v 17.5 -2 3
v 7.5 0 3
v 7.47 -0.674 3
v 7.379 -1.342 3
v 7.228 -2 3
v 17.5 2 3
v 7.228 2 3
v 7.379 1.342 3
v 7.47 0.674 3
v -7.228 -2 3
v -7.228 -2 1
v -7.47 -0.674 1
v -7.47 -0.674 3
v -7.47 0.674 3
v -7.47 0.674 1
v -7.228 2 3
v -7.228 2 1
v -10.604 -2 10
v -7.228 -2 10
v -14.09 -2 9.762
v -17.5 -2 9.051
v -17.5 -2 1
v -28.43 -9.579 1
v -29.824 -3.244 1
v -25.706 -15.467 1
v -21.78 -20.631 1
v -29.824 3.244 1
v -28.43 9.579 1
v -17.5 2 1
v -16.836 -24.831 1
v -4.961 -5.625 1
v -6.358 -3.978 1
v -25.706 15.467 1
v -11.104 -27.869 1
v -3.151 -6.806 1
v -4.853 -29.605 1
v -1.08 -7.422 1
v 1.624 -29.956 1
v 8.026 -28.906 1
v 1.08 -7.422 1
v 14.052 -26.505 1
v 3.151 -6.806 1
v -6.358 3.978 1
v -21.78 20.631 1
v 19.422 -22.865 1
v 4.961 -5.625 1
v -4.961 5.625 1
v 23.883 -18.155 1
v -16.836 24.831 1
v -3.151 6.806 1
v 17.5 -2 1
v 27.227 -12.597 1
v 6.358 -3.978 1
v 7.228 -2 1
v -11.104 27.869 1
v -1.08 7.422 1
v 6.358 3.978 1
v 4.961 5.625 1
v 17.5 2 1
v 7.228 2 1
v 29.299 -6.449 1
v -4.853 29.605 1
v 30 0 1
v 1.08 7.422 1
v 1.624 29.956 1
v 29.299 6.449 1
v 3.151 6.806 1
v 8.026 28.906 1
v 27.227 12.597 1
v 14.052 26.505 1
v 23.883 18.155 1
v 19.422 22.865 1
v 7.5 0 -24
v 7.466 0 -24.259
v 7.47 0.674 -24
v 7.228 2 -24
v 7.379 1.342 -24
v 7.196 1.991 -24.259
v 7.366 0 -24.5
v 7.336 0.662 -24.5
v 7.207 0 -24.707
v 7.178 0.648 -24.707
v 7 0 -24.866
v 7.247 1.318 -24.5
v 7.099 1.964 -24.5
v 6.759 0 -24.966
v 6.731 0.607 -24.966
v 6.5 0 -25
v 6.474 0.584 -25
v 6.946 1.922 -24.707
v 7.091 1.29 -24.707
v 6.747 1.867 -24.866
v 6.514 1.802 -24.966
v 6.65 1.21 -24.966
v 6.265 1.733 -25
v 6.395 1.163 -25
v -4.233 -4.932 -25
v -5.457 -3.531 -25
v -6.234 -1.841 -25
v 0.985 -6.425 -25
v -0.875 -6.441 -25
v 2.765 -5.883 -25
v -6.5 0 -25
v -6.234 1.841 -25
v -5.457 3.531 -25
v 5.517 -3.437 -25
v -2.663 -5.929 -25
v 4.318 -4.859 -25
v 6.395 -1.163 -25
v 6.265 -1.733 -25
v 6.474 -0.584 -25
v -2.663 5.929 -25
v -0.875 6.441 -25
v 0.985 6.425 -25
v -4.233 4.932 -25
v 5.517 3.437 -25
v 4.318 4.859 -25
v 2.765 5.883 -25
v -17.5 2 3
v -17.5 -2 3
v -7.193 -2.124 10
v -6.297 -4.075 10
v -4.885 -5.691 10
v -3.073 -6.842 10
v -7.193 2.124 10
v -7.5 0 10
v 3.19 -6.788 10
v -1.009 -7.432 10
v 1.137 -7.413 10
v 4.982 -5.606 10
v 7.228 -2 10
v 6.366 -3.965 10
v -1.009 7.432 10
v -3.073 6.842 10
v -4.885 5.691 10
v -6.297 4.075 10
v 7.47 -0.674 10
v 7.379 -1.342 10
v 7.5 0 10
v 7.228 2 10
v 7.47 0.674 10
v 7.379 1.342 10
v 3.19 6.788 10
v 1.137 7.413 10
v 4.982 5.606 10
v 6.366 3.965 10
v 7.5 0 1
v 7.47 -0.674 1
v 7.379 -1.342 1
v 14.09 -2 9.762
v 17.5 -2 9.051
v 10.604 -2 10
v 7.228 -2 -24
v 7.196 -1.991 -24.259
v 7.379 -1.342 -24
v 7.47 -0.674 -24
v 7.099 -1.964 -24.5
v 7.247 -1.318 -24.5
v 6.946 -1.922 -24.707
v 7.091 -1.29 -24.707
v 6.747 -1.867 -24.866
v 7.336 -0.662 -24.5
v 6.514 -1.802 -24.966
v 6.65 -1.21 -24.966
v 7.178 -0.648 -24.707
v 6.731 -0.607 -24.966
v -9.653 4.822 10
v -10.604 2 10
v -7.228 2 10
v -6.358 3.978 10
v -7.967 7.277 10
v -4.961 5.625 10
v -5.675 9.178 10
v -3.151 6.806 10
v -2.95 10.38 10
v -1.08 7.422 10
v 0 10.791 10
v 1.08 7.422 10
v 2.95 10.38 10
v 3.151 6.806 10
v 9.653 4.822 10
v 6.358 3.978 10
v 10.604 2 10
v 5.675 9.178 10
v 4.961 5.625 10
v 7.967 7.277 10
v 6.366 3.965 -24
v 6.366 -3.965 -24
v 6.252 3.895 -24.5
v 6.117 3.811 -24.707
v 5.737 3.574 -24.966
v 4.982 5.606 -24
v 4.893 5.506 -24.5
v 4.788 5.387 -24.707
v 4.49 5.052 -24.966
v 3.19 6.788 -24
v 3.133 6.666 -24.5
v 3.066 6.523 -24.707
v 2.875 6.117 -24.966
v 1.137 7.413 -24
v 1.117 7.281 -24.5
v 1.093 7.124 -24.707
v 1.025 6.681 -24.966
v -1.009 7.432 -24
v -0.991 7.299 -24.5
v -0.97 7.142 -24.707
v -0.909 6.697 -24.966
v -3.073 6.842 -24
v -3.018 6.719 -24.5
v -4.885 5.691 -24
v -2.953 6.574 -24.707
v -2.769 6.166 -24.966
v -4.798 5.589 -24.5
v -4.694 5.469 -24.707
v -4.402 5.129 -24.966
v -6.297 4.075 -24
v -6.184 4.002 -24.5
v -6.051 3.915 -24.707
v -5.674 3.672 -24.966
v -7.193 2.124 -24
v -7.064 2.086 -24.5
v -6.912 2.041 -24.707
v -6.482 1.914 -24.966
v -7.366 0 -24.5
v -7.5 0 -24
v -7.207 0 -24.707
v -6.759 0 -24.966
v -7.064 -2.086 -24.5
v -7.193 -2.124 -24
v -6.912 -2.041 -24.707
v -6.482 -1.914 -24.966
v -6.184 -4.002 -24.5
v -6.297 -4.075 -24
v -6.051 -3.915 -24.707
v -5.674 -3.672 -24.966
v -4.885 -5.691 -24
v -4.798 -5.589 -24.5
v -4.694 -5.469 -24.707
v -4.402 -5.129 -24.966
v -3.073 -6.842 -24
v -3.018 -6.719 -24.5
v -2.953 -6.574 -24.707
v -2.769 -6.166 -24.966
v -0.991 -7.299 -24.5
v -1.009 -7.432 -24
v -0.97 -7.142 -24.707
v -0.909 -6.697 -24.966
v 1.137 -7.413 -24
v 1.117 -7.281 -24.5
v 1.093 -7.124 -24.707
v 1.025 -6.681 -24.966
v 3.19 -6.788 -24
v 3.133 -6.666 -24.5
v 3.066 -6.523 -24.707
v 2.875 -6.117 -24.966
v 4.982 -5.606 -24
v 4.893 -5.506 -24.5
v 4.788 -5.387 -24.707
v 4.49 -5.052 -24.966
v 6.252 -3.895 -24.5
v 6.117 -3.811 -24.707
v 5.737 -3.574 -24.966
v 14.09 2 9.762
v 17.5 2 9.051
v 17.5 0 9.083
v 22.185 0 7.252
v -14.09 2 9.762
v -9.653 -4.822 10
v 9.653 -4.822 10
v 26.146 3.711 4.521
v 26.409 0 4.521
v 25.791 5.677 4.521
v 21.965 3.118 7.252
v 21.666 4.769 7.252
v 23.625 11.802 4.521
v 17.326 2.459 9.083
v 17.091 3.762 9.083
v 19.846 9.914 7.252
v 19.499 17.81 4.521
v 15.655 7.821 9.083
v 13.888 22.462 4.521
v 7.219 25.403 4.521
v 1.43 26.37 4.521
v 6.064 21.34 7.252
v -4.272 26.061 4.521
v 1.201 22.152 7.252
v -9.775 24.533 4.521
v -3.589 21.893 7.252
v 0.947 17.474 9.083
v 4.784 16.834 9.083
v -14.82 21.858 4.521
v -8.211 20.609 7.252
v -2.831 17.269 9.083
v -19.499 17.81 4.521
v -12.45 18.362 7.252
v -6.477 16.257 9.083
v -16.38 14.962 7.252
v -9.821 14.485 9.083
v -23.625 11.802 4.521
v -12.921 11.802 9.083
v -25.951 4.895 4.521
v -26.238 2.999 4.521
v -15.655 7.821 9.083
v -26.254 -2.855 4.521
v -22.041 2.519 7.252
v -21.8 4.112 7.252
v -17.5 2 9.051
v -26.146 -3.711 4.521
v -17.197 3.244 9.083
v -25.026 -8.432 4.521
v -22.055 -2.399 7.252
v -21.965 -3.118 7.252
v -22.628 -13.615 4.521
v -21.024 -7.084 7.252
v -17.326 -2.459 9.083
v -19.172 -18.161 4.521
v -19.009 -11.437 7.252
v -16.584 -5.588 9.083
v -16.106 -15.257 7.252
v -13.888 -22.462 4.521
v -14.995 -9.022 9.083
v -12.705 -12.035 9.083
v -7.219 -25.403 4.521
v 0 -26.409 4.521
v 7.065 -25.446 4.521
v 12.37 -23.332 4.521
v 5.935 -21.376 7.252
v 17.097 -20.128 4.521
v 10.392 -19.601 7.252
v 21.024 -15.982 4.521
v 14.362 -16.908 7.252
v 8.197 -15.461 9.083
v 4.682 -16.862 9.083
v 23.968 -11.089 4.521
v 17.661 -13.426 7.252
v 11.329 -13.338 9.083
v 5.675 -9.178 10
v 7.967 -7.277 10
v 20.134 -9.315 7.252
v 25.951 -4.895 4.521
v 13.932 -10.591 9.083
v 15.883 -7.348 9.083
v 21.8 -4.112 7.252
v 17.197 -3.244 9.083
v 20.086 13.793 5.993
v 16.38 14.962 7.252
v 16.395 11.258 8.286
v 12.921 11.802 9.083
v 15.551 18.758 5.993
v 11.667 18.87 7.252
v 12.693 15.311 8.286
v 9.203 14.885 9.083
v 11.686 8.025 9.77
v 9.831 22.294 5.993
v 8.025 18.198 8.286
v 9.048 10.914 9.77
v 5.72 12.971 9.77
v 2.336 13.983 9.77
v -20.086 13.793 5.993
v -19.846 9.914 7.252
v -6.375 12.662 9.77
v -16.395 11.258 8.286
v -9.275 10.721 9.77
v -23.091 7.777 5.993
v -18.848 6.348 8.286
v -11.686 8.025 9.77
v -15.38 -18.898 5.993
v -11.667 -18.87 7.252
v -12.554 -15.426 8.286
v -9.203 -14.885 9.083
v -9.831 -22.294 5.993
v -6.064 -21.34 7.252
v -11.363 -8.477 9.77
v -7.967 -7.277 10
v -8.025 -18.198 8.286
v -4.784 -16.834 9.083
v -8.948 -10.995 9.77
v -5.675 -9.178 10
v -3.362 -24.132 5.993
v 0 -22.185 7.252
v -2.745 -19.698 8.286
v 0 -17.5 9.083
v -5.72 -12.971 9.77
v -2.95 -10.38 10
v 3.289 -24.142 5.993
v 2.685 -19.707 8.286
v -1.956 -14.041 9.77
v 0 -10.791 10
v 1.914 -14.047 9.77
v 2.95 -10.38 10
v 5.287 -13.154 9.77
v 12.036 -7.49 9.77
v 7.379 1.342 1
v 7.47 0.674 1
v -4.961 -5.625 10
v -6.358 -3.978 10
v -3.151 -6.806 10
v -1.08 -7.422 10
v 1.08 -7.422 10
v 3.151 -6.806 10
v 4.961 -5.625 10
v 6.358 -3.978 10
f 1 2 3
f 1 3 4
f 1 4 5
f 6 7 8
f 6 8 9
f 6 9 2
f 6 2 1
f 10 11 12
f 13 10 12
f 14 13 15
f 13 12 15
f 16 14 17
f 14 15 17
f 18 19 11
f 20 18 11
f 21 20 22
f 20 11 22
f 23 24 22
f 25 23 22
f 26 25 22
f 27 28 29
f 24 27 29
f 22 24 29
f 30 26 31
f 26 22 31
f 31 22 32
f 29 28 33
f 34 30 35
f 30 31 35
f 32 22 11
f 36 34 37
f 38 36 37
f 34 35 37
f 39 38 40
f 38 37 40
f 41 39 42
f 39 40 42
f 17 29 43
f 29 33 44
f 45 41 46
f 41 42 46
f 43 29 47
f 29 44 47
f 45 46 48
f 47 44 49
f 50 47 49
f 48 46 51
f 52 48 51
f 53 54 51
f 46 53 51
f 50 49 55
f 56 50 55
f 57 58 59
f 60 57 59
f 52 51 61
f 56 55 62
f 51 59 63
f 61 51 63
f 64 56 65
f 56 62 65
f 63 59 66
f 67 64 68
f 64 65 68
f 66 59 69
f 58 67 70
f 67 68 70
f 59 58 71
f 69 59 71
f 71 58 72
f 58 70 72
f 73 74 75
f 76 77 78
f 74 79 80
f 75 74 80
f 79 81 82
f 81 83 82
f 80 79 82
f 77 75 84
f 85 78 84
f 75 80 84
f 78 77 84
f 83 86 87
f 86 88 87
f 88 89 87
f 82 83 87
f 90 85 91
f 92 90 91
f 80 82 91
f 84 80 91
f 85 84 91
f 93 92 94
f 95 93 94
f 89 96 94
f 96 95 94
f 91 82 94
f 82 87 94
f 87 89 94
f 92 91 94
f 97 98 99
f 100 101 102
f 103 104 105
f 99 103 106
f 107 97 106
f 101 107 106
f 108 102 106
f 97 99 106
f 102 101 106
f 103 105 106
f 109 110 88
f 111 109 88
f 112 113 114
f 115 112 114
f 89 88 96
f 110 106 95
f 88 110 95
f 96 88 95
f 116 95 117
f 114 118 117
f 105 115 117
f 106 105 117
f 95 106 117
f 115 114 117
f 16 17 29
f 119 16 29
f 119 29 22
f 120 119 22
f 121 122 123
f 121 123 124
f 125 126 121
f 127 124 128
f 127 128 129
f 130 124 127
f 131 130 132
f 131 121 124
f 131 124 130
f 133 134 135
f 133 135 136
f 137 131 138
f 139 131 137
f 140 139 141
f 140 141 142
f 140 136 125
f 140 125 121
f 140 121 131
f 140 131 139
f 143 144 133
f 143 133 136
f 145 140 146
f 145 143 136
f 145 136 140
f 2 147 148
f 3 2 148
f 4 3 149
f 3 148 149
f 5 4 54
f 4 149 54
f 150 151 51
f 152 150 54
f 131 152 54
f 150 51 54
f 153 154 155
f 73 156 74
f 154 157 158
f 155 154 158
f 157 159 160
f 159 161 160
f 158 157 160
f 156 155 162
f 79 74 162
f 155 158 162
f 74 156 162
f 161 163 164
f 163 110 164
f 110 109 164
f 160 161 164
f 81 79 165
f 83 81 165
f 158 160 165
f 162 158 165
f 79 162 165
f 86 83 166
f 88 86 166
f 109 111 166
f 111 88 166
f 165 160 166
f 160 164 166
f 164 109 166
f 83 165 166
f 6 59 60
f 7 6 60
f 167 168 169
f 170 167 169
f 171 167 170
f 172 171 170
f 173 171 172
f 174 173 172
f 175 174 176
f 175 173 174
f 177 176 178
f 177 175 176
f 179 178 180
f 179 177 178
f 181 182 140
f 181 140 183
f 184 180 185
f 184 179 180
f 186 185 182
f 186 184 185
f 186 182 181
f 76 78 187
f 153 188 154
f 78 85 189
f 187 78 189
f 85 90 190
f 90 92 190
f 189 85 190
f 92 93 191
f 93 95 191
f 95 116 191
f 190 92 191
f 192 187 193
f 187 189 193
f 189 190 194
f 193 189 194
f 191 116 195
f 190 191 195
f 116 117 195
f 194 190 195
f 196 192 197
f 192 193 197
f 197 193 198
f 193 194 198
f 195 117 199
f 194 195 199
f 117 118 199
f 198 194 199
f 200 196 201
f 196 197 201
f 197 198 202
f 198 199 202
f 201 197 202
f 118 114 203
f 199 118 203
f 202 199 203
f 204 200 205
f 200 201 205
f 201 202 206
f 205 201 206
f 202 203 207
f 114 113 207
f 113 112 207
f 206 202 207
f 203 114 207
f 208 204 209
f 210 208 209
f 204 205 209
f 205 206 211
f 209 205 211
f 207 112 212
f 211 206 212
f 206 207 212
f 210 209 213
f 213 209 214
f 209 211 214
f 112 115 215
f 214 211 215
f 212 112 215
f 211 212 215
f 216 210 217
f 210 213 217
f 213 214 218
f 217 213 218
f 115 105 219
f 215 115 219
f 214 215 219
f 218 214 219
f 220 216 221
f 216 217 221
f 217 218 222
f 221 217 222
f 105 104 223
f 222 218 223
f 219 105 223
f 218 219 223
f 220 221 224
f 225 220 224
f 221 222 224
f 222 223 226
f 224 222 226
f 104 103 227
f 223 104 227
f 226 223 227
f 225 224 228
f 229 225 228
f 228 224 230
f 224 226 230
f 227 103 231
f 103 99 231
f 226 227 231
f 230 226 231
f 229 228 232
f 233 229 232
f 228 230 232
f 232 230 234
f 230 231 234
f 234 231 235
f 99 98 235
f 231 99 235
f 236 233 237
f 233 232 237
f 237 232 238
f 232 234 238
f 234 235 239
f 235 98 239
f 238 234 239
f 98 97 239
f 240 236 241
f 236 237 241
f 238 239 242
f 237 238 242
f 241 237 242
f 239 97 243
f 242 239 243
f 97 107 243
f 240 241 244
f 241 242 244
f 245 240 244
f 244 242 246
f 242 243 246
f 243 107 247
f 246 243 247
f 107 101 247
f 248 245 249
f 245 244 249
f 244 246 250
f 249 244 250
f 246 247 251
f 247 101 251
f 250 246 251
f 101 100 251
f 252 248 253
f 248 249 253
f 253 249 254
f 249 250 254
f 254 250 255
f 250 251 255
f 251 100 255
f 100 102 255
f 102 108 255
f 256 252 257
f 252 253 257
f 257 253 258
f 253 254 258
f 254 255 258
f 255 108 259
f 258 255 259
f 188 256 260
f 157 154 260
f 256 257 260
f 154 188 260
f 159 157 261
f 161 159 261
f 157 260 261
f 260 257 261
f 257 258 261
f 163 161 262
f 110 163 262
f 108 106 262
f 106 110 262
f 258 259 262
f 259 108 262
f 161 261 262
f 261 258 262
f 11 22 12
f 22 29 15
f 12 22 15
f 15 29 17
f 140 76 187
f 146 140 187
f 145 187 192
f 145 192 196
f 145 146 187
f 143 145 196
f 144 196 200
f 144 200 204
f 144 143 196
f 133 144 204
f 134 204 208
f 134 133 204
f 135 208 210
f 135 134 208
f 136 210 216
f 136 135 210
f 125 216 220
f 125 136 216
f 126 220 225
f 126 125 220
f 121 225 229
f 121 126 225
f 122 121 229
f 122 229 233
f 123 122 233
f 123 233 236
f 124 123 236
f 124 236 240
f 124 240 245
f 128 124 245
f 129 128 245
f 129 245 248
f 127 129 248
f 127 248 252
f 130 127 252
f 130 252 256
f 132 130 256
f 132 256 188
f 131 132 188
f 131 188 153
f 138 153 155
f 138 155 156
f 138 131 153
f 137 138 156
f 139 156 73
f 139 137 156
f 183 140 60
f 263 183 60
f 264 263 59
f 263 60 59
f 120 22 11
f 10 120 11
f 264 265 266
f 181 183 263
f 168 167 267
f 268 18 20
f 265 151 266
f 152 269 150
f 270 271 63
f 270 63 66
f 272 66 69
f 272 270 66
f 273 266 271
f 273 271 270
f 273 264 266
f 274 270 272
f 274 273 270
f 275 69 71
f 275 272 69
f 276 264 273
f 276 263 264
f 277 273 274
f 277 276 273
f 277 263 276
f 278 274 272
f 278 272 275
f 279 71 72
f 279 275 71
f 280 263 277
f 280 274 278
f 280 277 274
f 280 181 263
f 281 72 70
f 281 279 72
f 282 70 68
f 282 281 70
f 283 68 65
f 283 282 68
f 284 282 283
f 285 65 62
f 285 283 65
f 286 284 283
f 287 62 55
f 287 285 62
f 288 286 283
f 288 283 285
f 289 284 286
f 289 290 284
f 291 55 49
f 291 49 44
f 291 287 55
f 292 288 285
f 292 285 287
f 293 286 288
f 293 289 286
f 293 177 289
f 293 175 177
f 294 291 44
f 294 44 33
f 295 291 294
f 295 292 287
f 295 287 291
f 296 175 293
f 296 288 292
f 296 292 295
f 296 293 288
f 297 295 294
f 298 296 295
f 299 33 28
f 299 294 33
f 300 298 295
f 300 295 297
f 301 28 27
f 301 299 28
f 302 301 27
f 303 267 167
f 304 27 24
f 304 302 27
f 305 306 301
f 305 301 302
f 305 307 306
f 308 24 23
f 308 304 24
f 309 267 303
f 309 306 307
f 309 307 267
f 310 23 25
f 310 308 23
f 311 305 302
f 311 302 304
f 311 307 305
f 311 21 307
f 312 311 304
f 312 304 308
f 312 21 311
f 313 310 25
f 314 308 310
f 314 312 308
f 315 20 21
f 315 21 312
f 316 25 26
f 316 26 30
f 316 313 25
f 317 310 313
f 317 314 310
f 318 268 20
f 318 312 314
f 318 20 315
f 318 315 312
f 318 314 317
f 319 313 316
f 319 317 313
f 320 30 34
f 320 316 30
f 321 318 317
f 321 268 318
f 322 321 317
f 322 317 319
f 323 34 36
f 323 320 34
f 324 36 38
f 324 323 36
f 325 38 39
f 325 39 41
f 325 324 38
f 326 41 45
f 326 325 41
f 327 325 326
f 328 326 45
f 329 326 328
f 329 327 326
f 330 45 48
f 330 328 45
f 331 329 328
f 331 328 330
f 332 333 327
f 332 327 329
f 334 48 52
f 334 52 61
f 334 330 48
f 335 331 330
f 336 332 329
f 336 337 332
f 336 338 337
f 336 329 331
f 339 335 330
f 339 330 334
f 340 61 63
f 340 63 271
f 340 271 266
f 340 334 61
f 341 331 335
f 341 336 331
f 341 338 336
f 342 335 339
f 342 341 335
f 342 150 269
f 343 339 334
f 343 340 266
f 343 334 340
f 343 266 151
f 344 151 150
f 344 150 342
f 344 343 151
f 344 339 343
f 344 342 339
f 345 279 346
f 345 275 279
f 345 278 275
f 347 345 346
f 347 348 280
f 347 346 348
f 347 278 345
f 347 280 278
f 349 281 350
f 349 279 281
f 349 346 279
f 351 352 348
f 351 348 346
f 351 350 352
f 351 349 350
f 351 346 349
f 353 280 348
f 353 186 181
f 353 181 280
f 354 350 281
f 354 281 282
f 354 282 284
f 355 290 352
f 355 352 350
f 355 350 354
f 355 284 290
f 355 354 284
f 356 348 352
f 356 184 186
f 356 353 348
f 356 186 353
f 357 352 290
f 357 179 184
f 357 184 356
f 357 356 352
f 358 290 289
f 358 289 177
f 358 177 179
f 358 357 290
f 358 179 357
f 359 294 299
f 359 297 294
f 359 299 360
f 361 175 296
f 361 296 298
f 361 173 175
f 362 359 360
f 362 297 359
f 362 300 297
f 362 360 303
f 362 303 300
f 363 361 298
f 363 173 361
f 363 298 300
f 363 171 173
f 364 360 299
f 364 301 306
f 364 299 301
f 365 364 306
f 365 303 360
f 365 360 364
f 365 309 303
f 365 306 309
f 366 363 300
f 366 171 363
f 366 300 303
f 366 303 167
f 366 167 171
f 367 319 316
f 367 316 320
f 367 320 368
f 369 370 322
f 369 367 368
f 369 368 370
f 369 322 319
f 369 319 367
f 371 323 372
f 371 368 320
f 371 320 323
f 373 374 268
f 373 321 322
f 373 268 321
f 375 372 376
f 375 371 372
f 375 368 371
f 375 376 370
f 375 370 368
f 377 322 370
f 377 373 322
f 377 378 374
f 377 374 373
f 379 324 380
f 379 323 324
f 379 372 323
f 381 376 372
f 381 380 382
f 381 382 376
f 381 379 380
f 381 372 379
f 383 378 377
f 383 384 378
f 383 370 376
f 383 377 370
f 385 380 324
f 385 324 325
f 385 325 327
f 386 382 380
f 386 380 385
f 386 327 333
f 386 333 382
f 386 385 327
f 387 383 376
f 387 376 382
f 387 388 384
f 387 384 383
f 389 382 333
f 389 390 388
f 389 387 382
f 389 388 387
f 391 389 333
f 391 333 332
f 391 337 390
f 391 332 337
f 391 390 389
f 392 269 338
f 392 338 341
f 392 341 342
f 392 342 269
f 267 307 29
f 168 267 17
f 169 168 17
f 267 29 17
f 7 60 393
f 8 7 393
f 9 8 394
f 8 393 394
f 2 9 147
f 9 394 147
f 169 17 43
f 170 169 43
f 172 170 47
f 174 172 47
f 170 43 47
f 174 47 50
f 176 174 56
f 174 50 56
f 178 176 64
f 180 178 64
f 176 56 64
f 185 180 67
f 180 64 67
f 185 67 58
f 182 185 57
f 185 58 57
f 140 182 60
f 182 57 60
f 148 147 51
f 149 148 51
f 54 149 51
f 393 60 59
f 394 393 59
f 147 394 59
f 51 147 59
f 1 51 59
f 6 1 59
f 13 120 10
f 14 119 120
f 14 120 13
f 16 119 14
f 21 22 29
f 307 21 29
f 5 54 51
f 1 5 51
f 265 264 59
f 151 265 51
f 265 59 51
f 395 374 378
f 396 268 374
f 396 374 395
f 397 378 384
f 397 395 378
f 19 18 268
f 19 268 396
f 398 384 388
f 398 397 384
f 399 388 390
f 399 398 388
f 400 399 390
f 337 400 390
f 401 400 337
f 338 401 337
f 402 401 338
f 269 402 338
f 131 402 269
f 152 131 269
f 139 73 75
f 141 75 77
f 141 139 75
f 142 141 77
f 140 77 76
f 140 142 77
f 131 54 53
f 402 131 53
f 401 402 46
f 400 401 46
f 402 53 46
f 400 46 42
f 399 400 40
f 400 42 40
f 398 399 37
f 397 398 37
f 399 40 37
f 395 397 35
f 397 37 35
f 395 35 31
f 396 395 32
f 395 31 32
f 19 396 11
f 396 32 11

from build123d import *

# Parameters (mm, degrees)
F1_DEPTH      = 10
F1_DEPTH_BACK = 25
F2_START      = 1
F0_R          = 30
F2_DEPTH      = 9
F4_R          = 1
F5_START      = 1
F5_DEPTH      = 2


# Not quite as in the source:
# - a fillet or chamfer that OpenCascade refuses, or shapes differently, is made with other operations: its cross-section is extruded or revolved along the edge and cut away or added


with BuildPart() as f1:
    # F0 (on Top) → F1 (new body, two sides)
    with BuildSketch(Plane.XY) as f1_sk:
        with BuildLine():
            ThreePointArc((7.2284161474, -2), (7.4317938987, -1.0091776094), (7.5, 0))
            ThreePointArc((7.5, 0), (7.4317938987, 1.0091776094), (7.2284161474, 2))
            Line((7.2284161474, 2), (-7.2284161474, 2))
            ThreePointArc((-7.2284161474, 2), (-7.5, 0), (-7.2284161474, -2))
            Line((-7.2284161474, -2), (7.2284161474, -2))
        make_face()
        with BuildLine():
            ThreePointArc((-7.2284161474, -2), (0, -7.5), (7.2284161474, -2))
            Line((7.2284161474, -2), (-7.2284161474, -2))
        make_face()
        with BuildLine():
            Line((-7.2284161474, 2), (7.2284161474, 2))
            ThreePointArc((7.2284161474, 2), (0, 7.5), (-7.2284161474, 2))
        make_face()
    extrude(amount=F1_DEPTH)
    extrude(f1_sk.sketch, amount=-F1_DEPTH_BACK)

    # F4
    f4_edges = [f1.edges().sort_by_distance(p)[0] for p in [
        (-7.228416, -2, -25),
    ]]
    fillet(f4_edges, radius=F4_R)


with BuildPart() as f2:
    # F0 (on Top) → F2 (new body)
    with BuildSketch(Plane.XY.offset(F2_START)):
        Circle(F0_R)
        with BuildLine():
            ThreePointArc((-7.2284161474, 2), (0, 7.5), (7.2284161474, 2))
            Line((7.2284161474, 2), (17.5, 2))
            Line((17.5, 2), (17.5, -2))
            Line((17.5, -2), (7.2284161474, -2))
            ThreePointArc((7.2284161474, -2), (0, -7.5), (-7.2284161474, -2))
            Line((-7.2284161474, -2), (-17.5, -2))
            Line((-17.5, -2), (-17.5, 2))
            Line((-17.5, 2), (-7.2284161474, 2))
        make_face(mode=Mode.SUBTRACT)
    extrude(amount=F2_DEPTH)

    # F3: fillet of radius 25 on 1 edges, made by hand

    # F3_s1 → F3_t2 (revolve, cut)
    with BuildSketch(Plane.XZ):
        with BuildLine():
            ThreePointArc((30, 1), (21.3972290055, 7.6384628453), (10.7906272877, 10))
            Line((10.7906272877, 10), (30, 10))
            Line((30, 10), (30, 1))
        make_face()
    revolve(axis=Axis((0, 0, 10), (0, 0, 1)), mode=Mode.SUBTRACT)


with BuildPart() as f5:
    # F0 (on Top) → F5 (new body)
    with BuildSketch(Plane.XY.offset(F5_START)):
        with BuildLine():
            ThreePointArc((-7.2284161474, -2), (-7.5, 0), (-7.2284161474, 2))
            Line((-7.2284161474, 2), (-17.5, 2))
            Line((-17.5, 2), (-17.5, -2))
            Line((-17.5, -2), (-7.2284161474, -2))
        make_face()
    extrude(amount=F5_DEPTH)


with BuildPart() as f5b:
    # F0 (on Top) → F5, piece 2 (new body)
    with BuildSketch(Plane.XY.offset(F5_START)):
        with BuildLine():
            ThreePointArc((7.2284161474, 2), (7.4317938987, 1.0091776094), (7.5, 0))
            ThreePointArc((7.5, 0), (7.4317938987, -1.0091776094), (7.2284161474, -2))
            Line((7.2284161474, -2), (17.5, -2))
            Line((17.5, -2), (17.5, 2))
            Line((17.5, 2), (7.2284161474, 2))
        make_face()
    extrude(amount=F5_DEPTH)


solid = Compound([f1.part, f2.part, f5.part, f5b.part])
